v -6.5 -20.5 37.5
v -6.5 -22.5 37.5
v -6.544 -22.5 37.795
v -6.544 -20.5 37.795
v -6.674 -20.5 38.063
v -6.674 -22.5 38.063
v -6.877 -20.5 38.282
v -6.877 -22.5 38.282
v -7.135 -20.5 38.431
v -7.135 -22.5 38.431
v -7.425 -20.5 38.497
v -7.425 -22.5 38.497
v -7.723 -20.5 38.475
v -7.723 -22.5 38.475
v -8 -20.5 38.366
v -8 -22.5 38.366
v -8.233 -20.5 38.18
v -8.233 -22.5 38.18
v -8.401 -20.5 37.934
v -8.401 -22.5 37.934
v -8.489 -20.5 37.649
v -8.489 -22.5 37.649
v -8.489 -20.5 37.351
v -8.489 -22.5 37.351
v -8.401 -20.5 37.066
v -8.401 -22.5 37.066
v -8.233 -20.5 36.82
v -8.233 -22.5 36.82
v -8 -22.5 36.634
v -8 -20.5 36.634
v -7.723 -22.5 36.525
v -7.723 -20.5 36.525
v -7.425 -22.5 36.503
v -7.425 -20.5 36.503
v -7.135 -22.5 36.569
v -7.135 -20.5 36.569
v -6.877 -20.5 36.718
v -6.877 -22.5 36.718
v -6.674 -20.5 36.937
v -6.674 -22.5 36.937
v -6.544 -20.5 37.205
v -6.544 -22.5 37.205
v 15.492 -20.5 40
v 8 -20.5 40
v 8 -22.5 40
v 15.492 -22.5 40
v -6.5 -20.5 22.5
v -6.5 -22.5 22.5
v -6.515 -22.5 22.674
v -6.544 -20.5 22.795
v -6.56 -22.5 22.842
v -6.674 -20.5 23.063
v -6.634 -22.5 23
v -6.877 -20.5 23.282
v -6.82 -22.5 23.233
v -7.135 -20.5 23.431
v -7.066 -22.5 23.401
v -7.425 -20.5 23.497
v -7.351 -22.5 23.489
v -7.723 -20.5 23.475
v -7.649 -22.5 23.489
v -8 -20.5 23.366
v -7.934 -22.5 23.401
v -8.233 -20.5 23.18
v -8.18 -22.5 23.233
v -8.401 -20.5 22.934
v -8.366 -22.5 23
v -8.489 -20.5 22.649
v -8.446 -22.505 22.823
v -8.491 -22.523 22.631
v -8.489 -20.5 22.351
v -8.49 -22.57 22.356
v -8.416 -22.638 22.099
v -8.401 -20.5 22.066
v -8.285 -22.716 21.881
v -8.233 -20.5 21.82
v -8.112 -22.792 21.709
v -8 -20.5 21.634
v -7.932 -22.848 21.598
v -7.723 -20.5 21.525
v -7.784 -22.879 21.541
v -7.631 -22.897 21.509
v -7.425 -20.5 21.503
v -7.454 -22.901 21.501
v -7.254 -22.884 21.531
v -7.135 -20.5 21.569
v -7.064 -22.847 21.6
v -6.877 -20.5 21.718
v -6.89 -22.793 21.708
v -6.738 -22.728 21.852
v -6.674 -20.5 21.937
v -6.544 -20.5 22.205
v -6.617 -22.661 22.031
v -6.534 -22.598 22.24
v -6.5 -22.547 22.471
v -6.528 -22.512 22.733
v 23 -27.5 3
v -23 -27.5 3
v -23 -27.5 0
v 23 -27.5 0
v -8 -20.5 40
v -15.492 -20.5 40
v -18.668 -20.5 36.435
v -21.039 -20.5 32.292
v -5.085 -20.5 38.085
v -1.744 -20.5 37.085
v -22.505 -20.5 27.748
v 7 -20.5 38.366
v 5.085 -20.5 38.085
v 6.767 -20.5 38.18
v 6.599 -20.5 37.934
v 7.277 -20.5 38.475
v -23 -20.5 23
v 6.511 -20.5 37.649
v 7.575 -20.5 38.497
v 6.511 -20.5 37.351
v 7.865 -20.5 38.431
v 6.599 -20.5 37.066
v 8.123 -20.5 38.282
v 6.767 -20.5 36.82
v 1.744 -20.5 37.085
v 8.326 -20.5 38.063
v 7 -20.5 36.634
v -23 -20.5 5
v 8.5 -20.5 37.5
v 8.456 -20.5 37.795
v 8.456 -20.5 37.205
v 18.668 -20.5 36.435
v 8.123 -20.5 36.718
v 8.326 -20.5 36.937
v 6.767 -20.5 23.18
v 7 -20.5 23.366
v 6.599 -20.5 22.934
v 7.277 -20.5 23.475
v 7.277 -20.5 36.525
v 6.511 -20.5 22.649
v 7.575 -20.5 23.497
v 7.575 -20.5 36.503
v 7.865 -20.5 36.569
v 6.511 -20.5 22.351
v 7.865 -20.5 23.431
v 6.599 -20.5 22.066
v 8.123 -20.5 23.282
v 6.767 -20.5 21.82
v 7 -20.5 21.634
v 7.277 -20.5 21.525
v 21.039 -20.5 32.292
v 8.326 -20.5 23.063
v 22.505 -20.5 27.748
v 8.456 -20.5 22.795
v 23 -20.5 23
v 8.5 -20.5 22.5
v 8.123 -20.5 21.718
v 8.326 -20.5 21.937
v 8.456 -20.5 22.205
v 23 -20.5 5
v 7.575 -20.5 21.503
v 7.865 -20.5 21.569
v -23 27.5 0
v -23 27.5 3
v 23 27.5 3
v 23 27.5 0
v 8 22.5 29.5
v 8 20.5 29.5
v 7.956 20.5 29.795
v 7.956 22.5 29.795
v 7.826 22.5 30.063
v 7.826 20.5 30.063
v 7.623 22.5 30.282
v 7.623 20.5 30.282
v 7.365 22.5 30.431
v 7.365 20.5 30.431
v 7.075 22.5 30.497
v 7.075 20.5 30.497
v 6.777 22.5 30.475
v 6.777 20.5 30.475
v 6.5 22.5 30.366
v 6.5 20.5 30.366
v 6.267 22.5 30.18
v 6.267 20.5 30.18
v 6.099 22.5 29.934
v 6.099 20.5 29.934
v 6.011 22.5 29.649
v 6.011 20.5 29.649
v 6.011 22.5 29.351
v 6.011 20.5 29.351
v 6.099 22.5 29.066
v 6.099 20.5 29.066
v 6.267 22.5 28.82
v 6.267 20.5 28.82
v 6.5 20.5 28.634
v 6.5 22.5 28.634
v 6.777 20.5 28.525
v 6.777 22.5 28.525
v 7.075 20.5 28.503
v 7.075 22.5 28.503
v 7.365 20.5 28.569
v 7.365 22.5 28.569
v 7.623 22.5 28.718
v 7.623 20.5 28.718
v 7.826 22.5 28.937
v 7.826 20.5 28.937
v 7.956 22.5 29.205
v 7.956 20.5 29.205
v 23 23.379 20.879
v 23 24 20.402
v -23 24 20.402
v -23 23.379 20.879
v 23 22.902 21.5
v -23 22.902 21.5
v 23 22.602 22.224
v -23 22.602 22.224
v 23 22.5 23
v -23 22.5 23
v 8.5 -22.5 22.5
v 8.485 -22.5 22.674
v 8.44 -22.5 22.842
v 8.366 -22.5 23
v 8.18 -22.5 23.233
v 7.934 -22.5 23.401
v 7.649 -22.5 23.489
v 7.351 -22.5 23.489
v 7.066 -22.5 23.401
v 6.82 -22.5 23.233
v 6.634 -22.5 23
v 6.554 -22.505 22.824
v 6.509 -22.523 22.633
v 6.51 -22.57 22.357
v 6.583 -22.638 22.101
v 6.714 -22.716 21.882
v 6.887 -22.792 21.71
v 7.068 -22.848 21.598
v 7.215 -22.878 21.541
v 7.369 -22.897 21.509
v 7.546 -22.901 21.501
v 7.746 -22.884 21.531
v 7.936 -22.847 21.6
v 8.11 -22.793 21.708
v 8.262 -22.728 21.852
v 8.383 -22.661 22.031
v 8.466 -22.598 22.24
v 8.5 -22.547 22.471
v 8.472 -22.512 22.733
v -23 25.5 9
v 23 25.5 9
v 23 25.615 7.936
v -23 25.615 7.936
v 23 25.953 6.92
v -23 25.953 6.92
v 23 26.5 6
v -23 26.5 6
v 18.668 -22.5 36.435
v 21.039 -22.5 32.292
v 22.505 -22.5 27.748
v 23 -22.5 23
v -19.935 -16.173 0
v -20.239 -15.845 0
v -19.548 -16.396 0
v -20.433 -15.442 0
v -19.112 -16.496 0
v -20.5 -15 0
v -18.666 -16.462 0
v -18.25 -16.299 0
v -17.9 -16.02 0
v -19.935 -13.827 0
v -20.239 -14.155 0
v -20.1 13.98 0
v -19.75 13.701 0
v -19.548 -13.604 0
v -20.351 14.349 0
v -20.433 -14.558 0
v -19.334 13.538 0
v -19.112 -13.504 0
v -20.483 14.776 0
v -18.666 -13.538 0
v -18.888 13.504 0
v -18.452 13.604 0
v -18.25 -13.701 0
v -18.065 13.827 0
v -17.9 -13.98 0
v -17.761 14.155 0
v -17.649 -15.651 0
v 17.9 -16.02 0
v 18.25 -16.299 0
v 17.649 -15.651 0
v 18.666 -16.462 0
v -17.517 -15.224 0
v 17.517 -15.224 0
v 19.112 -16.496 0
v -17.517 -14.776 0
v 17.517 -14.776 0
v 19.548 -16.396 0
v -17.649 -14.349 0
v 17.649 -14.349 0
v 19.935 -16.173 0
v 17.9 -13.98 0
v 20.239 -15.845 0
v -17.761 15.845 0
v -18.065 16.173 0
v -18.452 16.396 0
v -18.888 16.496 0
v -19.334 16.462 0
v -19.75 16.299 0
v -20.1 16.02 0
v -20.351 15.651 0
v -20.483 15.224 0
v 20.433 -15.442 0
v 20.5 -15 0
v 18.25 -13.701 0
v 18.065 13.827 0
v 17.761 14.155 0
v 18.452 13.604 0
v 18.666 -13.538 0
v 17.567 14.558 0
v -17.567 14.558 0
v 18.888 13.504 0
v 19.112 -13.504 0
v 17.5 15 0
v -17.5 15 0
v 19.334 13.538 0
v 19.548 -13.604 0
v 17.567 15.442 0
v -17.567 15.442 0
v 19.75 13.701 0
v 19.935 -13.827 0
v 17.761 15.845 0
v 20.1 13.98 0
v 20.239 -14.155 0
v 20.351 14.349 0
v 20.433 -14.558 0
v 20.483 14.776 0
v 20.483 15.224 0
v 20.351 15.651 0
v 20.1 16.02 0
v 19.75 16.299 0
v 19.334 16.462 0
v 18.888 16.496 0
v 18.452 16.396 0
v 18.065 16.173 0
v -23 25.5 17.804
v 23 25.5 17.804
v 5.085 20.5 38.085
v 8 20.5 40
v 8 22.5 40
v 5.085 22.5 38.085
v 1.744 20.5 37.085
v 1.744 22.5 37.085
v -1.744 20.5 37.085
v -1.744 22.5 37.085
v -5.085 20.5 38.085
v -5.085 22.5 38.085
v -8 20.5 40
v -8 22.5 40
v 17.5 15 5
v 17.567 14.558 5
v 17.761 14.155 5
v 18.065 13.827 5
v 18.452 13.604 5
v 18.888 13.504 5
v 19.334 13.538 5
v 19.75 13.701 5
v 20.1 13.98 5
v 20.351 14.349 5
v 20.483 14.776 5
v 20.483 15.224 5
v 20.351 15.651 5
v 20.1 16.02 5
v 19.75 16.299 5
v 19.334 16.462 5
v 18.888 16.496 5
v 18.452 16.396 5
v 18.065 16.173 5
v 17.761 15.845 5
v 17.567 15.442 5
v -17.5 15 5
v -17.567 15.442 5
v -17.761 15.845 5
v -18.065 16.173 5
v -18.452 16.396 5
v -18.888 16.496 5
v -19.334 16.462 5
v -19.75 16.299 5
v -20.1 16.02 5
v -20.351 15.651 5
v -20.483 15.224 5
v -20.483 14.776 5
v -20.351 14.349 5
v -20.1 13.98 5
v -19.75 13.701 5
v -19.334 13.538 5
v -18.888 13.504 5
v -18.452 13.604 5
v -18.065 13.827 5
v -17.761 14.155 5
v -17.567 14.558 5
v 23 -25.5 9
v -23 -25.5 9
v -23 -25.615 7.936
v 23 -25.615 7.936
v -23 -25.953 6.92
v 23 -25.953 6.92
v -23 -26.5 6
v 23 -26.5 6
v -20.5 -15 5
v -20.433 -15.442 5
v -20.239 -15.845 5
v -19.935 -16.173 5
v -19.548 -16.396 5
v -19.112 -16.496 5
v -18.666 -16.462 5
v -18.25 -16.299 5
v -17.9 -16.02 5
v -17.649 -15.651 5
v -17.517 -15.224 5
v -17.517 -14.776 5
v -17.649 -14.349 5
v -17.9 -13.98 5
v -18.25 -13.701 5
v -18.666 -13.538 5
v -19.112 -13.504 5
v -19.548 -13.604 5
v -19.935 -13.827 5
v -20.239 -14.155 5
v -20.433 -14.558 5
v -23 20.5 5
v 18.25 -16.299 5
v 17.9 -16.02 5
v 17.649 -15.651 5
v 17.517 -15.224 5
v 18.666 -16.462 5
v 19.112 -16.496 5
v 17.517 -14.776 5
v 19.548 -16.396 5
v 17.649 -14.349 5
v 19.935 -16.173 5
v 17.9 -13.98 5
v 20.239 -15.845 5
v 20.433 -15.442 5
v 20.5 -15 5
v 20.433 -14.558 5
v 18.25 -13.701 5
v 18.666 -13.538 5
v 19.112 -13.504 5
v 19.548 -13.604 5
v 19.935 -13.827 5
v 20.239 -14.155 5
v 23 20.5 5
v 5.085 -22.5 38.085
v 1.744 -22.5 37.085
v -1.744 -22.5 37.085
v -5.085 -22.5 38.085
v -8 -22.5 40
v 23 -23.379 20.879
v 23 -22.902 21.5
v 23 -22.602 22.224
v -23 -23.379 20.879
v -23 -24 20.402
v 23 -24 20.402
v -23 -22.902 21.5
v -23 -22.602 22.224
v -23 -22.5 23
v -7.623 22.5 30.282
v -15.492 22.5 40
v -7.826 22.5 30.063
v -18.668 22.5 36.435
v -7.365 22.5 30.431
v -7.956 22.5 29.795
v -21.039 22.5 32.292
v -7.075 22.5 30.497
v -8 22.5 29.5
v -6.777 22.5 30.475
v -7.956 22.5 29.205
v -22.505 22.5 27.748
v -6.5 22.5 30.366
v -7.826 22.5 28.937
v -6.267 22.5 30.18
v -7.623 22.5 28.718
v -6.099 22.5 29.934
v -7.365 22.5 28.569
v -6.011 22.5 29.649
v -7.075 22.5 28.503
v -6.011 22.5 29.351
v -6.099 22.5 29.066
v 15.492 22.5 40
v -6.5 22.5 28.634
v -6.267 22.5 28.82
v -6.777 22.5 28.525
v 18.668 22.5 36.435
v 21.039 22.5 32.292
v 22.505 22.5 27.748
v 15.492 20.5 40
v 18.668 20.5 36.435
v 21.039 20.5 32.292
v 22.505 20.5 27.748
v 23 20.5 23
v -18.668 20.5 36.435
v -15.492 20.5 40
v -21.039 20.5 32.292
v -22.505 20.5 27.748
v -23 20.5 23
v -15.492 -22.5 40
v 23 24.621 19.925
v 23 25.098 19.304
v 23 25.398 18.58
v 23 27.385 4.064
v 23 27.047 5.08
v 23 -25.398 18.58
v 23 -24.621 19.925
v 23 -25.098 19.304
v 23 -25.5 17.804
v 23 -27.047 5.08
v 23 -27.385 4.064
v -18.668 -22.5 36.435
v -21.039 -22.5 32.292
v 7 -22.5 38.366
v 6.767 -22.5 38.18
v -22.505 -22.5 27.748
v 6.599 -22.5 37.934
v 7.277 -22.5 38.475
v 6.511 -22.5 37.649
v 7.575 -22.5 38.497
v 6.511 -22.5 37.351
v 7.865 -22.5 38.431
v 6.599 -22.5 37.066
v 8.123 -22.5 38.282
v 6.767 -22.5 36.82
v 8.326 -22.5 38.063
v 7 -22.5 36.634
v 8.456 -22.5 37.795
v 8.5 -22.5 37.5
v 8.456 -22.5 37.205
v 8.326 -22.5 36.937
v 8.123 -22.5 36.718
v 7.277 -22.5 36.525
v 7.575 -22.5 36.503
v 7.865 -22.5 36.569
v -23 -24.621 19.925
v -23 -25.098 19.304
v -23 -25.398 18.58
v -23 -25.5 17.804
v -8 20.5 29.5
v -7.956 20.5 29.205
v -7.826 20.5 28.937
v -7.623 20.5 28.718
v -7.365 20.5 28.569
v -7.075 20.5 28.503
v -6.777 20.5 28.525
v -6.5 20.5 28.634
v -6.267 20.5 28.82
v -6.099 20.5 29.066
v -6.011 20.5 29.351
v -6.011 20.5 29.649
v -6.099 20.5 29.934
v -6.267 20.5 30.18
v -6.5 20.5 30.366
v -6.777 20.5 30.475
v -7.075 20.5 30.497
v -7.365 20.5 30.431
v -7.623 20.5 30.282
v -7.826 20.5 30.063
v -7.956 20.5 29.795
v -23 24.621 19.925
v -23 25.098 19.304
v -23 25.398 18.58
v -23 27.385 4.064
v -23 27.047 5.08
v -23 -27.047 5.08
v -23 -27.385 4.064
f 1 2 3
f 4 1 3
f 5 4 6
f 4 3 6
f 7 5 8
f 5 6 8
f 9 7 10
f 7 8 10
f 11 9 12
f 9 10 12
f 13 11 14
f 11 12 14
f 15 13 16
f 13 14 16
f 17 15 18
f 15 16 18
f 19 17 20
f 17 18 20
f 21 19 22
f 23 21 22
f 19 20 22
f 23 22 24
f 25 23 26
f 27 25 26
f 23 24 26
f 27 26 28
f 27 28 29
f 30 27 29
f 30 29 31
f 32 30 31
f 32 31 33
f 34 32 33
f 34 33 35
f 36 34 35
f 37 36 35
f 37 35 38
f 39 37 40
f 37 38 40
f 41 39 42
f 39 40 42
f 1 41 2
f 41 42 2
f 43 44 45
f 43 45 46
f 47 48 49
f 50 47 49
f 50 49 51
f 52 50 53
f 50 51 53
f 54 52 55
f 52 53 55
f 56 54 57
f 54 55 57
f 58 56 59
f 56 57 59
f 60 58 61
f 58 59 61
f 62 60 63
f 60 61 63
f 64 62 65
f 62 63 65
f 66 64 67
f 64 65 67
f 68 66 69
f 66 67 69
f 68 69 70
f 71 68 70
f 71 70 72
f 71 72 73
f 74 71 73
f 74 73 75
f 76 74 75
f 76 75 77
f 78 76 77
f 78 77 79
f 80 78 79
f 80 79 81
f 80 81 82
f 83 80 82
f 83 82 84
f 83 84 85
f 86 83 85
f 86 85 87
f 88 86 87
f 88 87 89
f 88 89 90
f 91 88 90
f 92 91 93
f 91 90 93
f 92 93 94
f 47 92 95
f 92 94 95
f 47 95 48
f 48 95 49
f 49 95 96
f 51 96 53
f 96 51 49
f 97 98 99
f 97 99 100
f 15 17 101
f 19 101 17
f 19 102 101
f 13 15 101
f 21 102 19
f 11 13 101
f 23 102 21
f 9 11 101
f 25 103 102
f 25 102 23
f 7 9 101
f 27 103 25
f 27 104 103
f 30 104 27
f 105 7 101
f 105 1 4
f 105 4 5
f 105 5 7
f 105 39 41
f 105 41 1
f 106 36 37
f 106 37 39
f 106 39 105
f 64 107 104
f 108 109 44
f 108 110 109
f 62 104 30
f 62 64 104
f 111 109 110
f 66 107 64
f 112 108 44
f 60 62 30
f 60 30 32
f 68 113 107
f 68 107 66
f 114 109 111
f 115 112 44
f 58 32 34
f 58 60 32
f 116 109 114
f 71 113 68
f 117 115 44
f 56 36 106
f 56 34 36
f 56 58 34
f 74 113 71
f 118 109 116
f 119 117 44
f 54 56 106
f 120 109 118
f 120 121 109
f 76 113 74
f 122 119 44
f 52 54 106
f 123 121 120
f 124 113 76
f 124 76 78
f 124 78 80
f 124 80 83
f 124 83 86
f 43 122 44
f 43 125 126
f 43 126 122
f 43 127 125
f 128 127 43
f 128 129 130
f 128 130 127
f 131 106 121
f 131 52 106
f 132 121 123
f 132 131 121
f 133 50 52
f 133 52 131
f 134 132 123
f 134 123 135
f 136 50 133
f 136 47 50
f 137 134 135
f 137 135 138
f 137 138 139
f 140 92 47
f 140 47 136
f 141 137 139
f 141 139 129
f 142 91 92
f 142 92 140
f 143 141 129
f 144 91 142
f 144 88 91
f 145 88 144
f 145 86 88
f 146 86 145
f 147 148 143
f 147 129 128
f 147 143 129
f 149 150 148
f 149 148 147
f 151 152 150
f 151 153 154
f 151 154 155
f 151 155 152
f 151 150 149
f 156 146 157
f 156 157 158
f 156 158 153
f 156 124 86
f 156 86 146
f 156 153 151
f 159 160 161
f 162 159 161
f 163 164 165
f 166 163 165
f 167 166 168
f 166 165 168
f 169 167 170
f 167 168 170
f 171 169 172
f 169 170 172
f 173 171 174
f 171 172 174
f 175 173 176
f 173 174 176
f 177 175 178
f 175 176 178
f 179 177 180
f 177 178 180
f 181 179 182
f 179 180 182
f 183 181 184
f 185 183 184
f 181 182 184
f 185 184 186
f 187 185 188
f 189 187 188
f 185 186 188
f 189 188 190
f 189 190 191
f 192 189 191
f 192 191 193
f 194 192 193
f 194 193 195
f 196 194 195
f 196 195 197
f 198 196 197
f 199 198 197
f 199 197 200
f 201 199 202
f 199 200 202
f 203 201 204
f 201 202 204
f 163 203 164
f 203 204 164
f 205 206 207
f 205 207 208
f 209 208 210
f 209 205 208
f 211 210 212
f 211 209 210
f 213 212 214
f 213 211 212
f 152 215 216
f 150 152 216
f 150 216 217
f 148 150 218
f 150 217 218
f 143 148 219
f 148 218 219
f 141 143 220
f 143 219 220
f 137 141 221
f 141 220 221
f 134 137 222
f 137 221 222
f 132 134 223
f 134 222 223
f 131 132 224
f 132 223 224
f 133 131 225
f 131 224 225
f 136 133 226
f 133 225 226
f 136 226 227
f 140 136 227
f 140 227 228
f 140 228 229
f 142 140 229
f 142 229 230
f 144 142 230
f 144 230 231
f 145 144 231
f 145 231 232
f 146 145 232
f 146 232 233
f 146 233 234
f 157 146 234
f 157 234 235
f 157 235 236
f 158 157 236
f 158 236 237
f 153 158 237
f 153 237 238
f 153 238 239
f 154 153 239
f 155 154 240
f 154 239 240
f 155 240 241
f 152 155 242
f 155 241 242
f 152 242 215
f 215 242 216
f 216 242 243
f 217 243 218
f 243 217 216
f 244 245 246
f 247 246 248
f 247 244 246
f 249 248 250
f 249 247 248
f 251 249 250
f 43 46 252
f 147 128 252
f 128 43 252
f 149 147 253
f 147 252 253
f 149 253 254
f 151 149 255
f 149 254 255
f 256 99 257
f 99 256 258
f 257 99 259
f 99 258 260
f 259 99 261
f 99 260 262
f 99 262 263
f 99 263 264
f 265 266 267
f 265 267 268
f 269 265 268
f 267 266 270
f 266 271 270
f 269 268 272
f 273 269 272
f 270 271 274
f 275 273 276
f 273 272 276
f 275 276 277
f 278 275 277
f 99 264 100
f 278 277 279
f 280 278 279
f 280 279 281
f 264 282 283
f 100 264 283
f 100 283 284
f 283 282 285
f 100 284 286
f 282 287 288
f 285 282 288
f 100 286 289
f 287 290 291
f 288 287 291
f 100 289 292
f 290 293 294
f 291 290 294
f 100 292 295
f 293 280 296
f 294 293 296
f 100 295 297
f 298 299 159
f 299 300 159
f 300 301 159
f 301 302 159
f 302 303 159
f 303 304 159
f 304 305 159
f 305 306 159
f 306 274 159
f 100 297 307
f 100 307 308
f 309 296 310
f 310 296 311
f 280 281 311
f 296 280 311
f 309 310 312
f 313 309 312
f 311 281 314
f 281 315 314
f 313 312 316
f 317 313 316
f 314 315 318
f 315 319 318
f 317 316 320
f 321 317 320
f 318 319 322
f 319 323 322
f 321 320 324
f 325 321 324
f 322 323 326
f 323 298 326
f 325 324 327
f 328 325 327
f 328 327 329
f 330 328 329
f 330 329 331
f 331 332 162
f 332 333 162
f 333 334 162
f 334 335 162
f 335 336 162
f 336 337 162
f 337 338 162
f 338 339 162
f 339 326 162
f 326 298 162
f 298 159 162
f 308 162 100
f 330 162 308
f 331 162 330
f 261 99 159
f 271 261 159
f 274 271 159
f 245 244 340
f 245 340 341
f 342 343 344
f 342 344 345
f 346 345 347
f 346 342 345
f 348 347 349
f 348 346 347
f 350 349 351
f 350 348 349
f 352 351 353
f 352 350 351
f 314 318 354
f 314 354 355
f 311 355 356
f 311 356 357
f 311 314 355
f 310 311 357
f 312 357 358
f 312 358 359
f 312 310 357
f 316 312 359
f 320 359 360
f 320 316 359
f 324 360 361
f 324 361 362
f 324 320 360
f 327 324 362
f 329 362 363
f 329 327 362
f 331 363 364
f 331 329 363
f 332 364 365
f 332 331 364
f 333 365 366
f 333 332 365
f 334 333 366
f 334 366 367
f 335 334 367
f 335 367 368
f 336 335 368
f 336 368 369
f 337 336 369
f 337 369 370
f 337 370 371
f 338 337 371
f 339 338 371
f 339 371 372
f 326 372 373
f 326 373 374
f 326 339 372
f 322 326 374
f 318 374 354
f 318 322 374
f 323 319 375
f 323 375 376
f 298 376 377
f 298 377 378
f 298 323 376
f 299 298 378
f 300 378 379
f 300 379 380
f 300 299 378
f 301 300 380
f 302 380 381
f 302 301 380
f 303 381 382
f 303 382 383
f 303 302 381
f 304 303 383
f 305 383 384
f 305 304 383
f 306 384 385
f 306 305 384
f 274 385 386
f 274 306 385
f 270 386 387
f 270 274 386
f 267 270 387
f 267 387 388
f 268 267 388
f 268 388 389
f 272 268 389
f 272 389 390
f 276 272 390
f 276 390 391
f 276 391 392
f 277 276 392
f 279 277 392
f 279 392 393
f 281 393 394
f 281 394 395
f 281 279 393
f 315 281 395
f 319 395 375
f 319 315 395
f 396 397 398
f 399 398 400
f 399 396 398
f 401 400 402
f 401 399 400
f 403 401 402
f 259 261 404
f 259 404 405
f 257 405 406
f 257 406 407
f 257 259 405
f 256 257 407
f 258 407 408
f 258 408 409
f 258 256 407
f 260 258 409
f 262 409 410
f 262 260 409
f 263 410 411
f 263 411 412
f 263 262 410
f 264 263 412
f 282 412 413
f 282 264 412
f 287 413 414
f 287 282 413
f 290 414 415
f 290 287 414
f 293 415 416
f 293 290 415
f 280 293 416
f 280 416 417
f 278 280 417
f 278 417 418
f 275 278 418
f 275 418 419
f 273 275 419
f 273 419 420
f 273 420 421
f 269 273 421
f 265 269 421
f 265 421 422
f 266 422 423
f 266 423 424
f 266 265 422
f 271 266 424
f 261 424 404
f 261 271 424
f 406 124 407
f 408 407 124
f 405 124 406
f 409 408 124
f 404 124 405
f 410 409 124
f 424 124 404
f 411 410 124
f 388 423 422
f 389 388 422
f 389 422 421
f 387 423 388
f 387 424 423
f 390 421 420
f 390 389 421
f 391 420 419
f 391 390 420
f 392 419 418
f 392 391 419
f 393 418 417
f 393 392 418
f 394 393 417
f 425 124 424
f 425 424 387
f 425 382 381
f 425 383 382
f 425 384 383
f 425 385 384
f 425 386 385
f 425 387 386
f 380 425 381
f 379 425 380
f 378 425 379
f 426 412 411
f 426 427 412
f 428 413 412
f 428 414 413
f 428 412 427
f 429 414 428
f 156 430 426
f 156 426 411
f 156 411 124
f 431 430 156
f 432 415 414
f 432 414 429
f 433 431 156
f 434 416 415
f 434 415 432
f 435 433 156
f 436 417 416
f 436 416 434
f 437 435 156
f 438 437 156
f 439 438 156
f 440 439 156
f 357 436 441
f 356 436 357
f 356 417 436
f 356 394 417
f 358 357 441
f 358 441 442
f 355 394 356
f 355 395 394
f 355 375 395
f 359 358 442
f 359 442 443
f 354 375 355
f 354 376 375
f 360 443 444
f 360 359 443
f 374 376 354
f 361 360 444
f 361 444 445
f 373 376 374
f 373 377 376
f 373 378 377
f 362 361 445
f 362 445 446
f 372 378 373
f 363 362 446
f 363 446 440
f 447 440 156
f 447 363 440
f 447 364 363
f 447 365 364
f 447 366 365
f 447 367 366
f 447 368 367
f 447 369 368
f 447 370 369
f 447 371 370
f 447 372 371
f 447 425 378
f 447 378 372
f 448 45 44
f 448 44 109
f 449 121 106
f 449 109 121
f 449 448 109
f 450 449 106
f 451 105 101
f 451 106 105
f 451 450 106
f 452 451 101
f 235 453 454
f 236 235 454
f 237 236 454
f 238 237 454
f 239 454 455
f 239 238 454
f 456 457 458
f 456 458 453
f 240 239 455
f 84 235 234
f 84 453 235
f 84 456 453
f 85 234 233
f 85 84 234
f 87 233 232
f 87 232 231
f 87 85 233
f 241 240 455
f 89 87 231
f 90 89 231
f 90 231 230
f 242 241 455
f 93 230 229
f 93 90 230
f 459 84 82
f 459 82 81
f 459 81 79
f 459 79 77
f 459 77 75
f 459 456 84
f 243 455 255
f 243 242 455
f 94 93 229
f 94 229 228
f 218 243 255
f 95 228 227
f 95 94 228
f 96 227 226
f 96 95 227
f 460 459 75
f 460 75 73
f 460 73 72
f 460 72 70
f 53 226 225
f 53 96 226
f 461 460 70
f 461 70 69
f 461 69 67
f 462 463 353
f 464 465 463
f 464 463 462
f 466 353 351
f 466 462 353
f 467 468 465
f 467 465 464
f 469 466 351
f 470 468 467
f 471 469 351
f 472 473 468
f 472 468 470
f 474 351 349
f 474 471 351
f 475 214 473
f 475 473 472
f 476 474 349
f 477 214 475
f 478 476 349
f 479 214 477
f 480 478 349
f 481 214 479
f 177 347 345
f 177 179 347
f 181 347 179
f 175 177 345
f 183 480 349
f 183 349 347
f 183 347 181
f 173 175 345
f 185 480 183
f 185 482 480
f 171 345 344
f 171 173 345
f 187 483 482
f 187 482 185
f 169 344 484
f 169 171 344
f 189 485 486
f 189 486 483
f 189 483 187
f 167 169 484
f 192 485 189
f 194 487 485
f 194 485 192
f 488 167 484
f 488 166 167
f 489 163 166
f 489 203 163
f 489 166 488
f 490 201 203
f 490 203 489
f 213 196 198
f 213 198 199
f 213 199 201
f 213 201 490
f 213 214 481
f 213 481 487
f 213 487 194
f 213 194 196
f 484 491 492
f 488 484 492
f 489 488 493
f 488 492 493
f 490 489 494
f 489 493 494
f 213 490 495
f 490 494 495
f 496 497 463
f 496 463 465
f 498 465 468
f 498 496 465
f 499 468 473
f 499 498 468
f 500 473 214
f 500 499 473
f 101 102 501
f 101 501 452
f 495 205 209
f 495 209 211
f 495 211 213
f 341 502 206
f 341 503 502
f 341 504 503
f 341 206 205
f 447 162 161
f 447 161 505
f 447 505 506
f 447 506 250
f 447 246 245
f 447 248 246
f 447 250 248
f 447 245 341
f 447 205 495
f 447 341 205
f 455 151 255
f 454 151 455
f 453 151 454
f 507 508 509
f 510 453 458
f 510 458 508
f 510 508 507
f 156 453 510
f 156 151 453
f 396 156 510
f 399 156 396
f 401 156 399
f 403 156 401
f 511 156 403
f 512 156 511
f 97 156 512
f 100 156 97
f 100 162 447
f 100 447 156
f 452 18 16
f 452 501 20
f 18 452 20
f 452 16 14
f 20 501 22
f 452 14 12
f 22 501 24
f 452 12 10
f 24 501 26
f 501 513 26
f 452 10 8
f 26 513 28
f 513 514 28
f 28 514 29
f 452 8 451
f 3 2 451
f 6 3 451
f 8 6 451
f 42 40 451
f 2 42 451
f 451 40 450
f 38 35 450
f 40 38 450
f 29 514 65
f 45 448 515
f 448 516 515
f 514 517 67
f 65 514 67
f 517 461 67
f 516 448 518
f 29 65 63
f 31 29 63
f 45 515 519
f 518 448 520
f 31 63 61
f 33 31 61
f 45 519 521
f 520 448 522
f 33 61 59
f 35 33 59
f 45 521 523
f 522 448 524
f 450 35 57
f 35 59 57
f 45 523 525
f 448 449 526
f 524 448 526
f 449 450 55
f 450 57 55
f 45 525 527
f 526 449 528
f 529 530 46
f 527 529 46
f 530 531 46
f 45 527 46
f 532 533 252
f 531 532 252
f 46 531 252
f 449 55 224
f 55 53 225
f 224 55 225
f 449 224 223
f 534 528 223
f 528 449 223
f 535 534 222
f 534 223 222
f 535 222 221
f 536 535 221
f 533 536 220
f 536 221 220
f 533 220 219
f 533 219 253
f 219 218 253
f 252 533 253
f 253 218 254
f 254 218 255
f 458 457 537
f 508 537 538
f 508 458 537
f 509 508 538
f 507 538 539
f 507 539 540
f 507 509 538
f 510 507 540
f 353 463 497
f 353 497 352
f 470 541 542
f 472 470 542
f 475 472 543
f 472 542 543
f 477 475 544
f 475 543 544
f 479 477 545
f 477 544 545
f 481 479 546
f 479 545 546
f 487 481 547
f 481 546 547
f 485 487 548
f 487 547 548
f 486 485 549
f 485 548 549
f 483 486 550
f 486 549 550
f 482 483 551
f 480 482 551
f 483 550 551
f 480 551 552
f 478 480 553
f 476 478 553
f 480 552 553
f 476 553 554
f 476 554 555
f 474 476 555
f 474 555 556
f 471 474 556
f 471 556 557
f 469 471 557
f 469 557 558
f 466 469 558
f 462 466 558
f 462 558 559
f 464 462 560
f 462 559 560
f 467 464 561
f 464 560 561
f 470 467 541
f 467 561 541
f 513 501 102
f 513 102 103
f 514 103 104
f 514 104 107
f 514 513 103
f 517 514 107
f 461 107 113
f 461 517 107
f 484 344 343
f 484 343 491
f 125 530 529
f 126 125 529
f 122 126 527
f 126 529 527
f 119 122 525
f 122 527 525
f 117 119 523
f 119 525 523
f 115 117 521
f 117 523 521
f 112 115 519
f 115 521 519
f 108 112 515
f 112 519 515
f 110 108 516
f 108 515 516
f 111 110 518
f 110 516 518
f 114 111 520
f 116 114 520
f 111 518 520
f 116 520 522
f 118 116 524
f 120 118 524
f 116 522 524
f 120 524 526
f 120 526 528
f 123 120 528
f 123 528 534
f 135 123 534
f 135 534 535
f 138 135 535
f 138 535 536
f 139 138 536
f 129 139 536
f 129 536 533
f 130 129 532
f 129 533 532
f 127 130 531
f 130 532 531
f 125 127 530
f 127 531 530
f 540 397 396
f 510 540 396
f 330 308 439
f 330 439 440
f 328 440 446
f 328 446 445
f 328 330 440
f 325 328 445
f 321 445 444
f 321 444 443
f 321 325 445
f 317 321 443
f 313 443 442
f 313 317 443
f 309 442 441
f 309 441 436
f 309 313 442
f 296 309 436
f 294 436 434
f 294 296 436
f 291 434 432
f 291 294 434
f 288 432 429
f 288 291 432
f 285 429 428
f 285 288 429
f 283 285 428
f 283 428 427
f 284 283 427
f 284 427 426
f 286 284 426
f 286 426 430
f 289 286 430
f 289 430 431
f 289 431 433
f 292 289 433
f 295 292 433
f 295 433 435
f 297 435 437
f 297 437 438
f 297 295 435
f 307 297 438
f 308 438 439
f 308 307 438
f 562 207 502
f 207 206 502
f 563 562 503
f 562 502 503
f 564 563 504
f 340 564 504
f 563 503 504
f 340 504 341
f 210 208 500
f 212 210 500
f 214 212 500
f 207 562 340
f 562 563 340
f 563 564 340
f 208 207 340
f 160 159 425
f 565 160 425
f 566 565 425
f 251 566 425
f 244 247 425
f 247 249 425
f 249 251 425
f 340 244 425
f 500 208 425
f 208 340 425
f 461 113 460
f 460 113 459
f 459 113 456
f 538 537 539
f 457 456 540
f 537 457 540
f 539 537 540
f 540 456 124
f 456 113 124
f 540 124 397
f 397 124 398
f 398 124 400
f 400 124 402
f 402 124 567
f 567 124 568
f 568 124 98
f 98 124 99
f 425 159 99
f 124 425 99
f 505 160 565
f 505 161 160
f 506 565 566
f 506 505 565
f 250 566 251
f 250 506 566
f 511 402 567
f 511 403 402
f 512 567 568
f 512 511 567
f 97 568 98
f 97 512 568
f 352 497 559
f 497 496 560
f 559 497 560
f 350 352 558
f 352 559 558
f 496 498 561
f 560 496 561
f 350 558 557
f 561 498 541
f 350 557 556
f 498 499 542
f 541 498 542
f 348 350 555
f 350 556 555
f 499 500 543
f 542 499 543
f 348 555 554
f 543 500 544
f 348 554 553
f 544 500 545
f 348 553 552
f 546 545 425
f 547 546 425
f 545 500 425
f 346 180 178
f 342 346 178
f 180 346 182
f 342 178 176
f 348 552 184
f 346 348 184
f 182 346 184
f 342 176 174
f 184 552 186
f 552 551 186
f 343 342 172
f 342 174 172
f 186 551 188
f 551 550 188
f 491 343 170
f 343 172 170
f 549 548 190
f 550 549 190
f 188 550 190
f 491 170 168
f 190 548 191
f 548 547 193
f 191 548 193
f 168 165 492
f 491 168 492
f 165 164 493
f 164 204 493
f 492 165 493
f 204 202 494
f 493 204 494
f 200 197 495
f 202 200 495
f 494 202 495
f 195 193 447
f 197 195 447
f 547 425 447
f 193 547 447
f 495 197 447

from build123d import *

# Parameters (mm, degrees)
SKETCH_1_W          = 46
SKETCH_1_H          = 40
SKETCH_1_R          = 1.5
EXTRUDE_1_DEPTH     = 5
SKETCH_2_W          = 46
SKETCH_2_H          = 7.5
EXTRUDE_2_DEPTH     = 5
SKETCH_3_W          = 46
SKETCH_3_H          = 5
EXTRUDE_3_DEPTH     = 15
FILLET_1_R          = 5
FILLET_2_R          = 5
SKETCH_4_W          = 46
SKETCH_4_H          = 2
EXTRUDE_4_DEPTH     = 20
SKETCH_5_R          = 1
CUT_EXTRUDE_1_DEPTH = 2
SKETCH_6_R          = 1
CUT_EXTRUDE_2_DEPTH = 2
FILLET_3_R          = 3
FILLET_4_R          = 3
CUT_EXTRUDE_3_REACH = 70.037


with BuildPart() as part:
    # 草图1 → 凸台-拉伸1 (new body)
    with BuildSketch(Plane.XY):
        Rectangle(SKETCH_1_W, SKETCH_1_H)
        with Locations((-19, 15)):
            Circle(SKETCH_1_R, mode=Mode.SUBTRACT)
        with Locations(Location((19, 15, 0), (0, 0, 180))):
            Circle(SKETCH_1_R, mode=Mode.SUBTRACT)
        with Locations((19, -15)):
            Circle(SKETCH_1_R, mode=Mode.SUBTRACT)
        with Locations(Location((-19, -15, 0), (0, 0, 180))):
            Circle(SKETCH_1_R, mode=Mode.SUBTRACT)
    extrude(amount=EXTRUDE_1_DEPTH)

    # 草图2 → 凸台-拉伸2 (add)
    with BuildSketch(Plane.XY.offset(5)):
        with Locations((0, -23.75)):
            Rectangle(SKETCH_2_W, SKETCH_2_H)
        with Locations((0, 23.75)):
            Rectangle(SKETCH_2_W, SKETCH_2_H)
    extrude(amount=-EXTRUDE_2_DEPTH)

    # 草图3 → 凸台-拉伸3 (add)
    with BuildSketch(Plane.XY.offset(5)):
        with Locations((0, -23)):
            Rectangle(SKETCH_3_W, SKETCH_3_H)
        with Locations((0, 23)):
            Rectangle(SKETCH_3_W, SKETCH_3_H)
    extrude(amount=EXTRUDE_3_DEPTH)

    # 圆角1
    # the kernel refuses this fillet: 5 mm, written as the material it adds along each edge
    with BuildSketch(Plane(origin=(23, -25.5, 5), x_dir=(0, -1, 0), z_dir=(-1, 0, 0)), Plane(origin=(-23, 25.5, 5), x_dir=(0, 1, 0), z_dir=(1, 0, 0))) as fillet_1_piece_1:
        with BuildLine():
            CenterArc((5, 4), FILLET_1_R, 180, 53.130102354)
            Line((0, 4), (-0.1, 4))
            Line((-0.1, 4), (-0.1, 0))
            Line((-0.1, 0), (0, -0.1))
            ThreePointArc((0, -0.1), (1, -0.1), (1.94, -0.08))
            Line((1.94, -0.08), (2, 0))
        make_face()
    extrude(amount=46)

    # 圆角2
    fillet_2_edges = [part.edges().sort_by_distance(p)[0] for p in [
        (0, 27.5, 5),
        (0, -27.5, 5),
    ]]
    fillet(fillet_2_edges, radius=FILLET_2_R)

    # 草图4 → 凸台-拉伸4 (add)
    with BuildSketch(Plane.XY.offset(20)):
        with Locations((0, 21.5)):
            Rectangle(SKETCH_4_W, SKETCH_4_H)
        with Locations((0, -21.5)):
            Rectangle(SKETCH_4_W, SKETCH_4_H)
    extrude(amount=EXTRUDE_4_DEPTH)

    # 草图5 → 切除-拉伸1 (cut)
    with BuildSketch(Plane.XZ.offset(22.5)):
        with Locations((-7.5, 37.5)):
            Circle(SKETCH_5_R)
        with Locations((7.5, 37.5)):
            Circle(SKETCH_5_R)
        with Locations((-7.5, 22.5)):
            Circle(SKETCH_5_R)
        with Locations((7.5, 22.5)):
            Circle(SKETCH_5_R)
    extrude(amount=-CUT_EXTRUDE_1_DEPTH, mode=Mode.SUBTRACT)

    # 草图6 → 切除-拉伸2 (cut)
    with BuildSketch(Plane.XZ.offset(-20.5)):
        with Locations((7, 29.5)):
            Circle(SKETCH_6_R)
        with Locations(Location((-7, 29.5, 0), (0, 0, 180))):
            Circle(SKETCH_6_R)
    extrude(amount=-CUT_EXTRUDE_2_DEPTH, mode=Mode.SUBTRACT)

    # 圆角3
    # the kernel refuses this fillet: 3 mm, written as the material it adds along each edge
    with BuildSketch(Plane(origin=(-23, -22.5, 20), x_dir=(0, 0, 1), z_dir=(1, 0, 0))) as fillet_3_piece_1_section:
        with BuildLine():
            CenterArc((FILLET_3_R, FILLET_3_R), FILLET_3_R, 180, 90)
            Line((0, FILLET_3_R), (0, 0))
            Line((0, 0), (FILLET_3_R, 0))
        make_face()
    fillet_3_piece_1 = extrude(amount=46, mode=Mode.PRIVATE)
    fillet_3_piece_1 = fillet_3_piece_1 - Plane(origin=(-7.5, -23.184161647, 22.5), x_dir=(1, 0, 0), z_dir=(0, -1, 0)) * Cylinder(1, 104, mode=Mode.PRIVATE)
    fillet_3_piece_1 = fillet_3_piece_1 - Plane(origin=(7.5, -23.184161647, 22.5), x_dir=(1, 0, 0), z_dir=(0, -1, 0)) * Cylinder(1, 104, mode=Mode.PRIVATE)
    add(fillet_3_piece_1)
    with BuildSketch(Plane(origin=(23, 22.5, 20), x_dir=(0, 1, 0), z_dir=(-1, 0, 0))) as fillet_3_piece_2:
        with BuildLine():
            CenterArc((FILLET_3_R, -FILLET_3_R), FILLET_3_R, 90, 90)
            Line((0, -FILLET_3_R), (0, 0))
            Line((0, 0), (FILLET_3_R, 0))
        make_face()
    extrude(amount=46)

    # 圆角4
    fillet_4_edges = [part.edges().sort_by_distance(p)[0] for p in [
        (0, 25.5, 20),
        (0, -25.5, 20),
    ]]
    fillet(fillet_4_edges, radius=FILLET_4_R)

    # 切除-拉伸3: up to this face of the body (flat: up to its plane)
    cut_extrude_3_end = Plane(part.part.faces().sort_by_distance((0, 22.5, 31.516199688))[0])
    # 草图7 → 切除-拉伸3 (cut, up to the picked face)
    with BuildSketch(Plane.XZ.offset(22.5), mode=Mode.PRIVATE) as cut_extrude_3_sk1:
        with BuildLine():
            Line((-8, 40), (8, 40))
            ThreePointArc((8, 40), (0, 36.958405421), (-8, 40))
        make_face()
    cut_extrude_3_tool1 = split(extrude(cut_extrude_3_sk1.sketch, amount=-CUT_EXTRUDE_3_REACH, mode=Mode.PRIVATE), bisect_by=cut_extrude_3_end, keep=Keep.BOTH, mode=Mode.PRIVATE)
    # 草图7 → 切除-拉伸3 (cut, up to the picked face)
    with BuildSketch(Plane.XZ.offset(22.5), mode=Mode.PRIVATE) as cut_extrude_3_sk2:
        with BuildLine():
            Line((-23, 23), (-23, 40))
            Line((-23, 40), (-15.491933385, 40))
            ThreePointArc((-15.491933385, 40), (-21.03942095, 32.292080826), (-23, 23))
        make_face()
    cut_extrude_3_tool2 = split(extrude(cut_extrude_3_sk2.sketch, amount=-CUT_EXTRUDE_3_REACH, mode=Mode.PRIVATE), bisect_by=cut_extrude_3_end, keep=Keep.BOTH, mode=Mode.PRIVATE)
    # 草图7 → 切除-拉伸3 (cut, up to the picked face)
    with BuildSketch(Plane.XZ.offset(22.5), mode=Mode.PRIVATE) as cut_extrude_3_sk3:
        with BuildLine():
            Line((23, 23), (23, 40))
            Line((23, 40), (15.491933385, 40))
            ThreePointArc((15.491933385, 40), (21.03942095, 32.292080826), (23, 23))
        make_face()
    cut_extrude_3_tool3 = split(extrude(cut_extrude_3_sk3.sketch, amount=-CUT_EXTRUDE_3_REACH, mode=Mode.PRIVATE), bisect_by=cut_extrude_3_end, keep=Keep.BOTH, mode=Mode.PRIVATE)
    add(cut_extrude_3_tool1.solids().sort_by(Axis((0, -22.5, 38.769148), (0, 1, 0)))[0], mode=Mode.SUBTRACT)
    add(cut_extrude_3_tool2.solids().sort_by(Axis((-20.828476, -22.5, 35.901225), (0, 1, 0)))[0], mode=Mode.SUBTRACT)
    add(cut_extrude_3_tool3.solids().sort_by(Axis((20.828476, -22.5, 35.901225), (0, 1, 0)))[0], mode=Mode.SUBTRACT)


solid = part.part
